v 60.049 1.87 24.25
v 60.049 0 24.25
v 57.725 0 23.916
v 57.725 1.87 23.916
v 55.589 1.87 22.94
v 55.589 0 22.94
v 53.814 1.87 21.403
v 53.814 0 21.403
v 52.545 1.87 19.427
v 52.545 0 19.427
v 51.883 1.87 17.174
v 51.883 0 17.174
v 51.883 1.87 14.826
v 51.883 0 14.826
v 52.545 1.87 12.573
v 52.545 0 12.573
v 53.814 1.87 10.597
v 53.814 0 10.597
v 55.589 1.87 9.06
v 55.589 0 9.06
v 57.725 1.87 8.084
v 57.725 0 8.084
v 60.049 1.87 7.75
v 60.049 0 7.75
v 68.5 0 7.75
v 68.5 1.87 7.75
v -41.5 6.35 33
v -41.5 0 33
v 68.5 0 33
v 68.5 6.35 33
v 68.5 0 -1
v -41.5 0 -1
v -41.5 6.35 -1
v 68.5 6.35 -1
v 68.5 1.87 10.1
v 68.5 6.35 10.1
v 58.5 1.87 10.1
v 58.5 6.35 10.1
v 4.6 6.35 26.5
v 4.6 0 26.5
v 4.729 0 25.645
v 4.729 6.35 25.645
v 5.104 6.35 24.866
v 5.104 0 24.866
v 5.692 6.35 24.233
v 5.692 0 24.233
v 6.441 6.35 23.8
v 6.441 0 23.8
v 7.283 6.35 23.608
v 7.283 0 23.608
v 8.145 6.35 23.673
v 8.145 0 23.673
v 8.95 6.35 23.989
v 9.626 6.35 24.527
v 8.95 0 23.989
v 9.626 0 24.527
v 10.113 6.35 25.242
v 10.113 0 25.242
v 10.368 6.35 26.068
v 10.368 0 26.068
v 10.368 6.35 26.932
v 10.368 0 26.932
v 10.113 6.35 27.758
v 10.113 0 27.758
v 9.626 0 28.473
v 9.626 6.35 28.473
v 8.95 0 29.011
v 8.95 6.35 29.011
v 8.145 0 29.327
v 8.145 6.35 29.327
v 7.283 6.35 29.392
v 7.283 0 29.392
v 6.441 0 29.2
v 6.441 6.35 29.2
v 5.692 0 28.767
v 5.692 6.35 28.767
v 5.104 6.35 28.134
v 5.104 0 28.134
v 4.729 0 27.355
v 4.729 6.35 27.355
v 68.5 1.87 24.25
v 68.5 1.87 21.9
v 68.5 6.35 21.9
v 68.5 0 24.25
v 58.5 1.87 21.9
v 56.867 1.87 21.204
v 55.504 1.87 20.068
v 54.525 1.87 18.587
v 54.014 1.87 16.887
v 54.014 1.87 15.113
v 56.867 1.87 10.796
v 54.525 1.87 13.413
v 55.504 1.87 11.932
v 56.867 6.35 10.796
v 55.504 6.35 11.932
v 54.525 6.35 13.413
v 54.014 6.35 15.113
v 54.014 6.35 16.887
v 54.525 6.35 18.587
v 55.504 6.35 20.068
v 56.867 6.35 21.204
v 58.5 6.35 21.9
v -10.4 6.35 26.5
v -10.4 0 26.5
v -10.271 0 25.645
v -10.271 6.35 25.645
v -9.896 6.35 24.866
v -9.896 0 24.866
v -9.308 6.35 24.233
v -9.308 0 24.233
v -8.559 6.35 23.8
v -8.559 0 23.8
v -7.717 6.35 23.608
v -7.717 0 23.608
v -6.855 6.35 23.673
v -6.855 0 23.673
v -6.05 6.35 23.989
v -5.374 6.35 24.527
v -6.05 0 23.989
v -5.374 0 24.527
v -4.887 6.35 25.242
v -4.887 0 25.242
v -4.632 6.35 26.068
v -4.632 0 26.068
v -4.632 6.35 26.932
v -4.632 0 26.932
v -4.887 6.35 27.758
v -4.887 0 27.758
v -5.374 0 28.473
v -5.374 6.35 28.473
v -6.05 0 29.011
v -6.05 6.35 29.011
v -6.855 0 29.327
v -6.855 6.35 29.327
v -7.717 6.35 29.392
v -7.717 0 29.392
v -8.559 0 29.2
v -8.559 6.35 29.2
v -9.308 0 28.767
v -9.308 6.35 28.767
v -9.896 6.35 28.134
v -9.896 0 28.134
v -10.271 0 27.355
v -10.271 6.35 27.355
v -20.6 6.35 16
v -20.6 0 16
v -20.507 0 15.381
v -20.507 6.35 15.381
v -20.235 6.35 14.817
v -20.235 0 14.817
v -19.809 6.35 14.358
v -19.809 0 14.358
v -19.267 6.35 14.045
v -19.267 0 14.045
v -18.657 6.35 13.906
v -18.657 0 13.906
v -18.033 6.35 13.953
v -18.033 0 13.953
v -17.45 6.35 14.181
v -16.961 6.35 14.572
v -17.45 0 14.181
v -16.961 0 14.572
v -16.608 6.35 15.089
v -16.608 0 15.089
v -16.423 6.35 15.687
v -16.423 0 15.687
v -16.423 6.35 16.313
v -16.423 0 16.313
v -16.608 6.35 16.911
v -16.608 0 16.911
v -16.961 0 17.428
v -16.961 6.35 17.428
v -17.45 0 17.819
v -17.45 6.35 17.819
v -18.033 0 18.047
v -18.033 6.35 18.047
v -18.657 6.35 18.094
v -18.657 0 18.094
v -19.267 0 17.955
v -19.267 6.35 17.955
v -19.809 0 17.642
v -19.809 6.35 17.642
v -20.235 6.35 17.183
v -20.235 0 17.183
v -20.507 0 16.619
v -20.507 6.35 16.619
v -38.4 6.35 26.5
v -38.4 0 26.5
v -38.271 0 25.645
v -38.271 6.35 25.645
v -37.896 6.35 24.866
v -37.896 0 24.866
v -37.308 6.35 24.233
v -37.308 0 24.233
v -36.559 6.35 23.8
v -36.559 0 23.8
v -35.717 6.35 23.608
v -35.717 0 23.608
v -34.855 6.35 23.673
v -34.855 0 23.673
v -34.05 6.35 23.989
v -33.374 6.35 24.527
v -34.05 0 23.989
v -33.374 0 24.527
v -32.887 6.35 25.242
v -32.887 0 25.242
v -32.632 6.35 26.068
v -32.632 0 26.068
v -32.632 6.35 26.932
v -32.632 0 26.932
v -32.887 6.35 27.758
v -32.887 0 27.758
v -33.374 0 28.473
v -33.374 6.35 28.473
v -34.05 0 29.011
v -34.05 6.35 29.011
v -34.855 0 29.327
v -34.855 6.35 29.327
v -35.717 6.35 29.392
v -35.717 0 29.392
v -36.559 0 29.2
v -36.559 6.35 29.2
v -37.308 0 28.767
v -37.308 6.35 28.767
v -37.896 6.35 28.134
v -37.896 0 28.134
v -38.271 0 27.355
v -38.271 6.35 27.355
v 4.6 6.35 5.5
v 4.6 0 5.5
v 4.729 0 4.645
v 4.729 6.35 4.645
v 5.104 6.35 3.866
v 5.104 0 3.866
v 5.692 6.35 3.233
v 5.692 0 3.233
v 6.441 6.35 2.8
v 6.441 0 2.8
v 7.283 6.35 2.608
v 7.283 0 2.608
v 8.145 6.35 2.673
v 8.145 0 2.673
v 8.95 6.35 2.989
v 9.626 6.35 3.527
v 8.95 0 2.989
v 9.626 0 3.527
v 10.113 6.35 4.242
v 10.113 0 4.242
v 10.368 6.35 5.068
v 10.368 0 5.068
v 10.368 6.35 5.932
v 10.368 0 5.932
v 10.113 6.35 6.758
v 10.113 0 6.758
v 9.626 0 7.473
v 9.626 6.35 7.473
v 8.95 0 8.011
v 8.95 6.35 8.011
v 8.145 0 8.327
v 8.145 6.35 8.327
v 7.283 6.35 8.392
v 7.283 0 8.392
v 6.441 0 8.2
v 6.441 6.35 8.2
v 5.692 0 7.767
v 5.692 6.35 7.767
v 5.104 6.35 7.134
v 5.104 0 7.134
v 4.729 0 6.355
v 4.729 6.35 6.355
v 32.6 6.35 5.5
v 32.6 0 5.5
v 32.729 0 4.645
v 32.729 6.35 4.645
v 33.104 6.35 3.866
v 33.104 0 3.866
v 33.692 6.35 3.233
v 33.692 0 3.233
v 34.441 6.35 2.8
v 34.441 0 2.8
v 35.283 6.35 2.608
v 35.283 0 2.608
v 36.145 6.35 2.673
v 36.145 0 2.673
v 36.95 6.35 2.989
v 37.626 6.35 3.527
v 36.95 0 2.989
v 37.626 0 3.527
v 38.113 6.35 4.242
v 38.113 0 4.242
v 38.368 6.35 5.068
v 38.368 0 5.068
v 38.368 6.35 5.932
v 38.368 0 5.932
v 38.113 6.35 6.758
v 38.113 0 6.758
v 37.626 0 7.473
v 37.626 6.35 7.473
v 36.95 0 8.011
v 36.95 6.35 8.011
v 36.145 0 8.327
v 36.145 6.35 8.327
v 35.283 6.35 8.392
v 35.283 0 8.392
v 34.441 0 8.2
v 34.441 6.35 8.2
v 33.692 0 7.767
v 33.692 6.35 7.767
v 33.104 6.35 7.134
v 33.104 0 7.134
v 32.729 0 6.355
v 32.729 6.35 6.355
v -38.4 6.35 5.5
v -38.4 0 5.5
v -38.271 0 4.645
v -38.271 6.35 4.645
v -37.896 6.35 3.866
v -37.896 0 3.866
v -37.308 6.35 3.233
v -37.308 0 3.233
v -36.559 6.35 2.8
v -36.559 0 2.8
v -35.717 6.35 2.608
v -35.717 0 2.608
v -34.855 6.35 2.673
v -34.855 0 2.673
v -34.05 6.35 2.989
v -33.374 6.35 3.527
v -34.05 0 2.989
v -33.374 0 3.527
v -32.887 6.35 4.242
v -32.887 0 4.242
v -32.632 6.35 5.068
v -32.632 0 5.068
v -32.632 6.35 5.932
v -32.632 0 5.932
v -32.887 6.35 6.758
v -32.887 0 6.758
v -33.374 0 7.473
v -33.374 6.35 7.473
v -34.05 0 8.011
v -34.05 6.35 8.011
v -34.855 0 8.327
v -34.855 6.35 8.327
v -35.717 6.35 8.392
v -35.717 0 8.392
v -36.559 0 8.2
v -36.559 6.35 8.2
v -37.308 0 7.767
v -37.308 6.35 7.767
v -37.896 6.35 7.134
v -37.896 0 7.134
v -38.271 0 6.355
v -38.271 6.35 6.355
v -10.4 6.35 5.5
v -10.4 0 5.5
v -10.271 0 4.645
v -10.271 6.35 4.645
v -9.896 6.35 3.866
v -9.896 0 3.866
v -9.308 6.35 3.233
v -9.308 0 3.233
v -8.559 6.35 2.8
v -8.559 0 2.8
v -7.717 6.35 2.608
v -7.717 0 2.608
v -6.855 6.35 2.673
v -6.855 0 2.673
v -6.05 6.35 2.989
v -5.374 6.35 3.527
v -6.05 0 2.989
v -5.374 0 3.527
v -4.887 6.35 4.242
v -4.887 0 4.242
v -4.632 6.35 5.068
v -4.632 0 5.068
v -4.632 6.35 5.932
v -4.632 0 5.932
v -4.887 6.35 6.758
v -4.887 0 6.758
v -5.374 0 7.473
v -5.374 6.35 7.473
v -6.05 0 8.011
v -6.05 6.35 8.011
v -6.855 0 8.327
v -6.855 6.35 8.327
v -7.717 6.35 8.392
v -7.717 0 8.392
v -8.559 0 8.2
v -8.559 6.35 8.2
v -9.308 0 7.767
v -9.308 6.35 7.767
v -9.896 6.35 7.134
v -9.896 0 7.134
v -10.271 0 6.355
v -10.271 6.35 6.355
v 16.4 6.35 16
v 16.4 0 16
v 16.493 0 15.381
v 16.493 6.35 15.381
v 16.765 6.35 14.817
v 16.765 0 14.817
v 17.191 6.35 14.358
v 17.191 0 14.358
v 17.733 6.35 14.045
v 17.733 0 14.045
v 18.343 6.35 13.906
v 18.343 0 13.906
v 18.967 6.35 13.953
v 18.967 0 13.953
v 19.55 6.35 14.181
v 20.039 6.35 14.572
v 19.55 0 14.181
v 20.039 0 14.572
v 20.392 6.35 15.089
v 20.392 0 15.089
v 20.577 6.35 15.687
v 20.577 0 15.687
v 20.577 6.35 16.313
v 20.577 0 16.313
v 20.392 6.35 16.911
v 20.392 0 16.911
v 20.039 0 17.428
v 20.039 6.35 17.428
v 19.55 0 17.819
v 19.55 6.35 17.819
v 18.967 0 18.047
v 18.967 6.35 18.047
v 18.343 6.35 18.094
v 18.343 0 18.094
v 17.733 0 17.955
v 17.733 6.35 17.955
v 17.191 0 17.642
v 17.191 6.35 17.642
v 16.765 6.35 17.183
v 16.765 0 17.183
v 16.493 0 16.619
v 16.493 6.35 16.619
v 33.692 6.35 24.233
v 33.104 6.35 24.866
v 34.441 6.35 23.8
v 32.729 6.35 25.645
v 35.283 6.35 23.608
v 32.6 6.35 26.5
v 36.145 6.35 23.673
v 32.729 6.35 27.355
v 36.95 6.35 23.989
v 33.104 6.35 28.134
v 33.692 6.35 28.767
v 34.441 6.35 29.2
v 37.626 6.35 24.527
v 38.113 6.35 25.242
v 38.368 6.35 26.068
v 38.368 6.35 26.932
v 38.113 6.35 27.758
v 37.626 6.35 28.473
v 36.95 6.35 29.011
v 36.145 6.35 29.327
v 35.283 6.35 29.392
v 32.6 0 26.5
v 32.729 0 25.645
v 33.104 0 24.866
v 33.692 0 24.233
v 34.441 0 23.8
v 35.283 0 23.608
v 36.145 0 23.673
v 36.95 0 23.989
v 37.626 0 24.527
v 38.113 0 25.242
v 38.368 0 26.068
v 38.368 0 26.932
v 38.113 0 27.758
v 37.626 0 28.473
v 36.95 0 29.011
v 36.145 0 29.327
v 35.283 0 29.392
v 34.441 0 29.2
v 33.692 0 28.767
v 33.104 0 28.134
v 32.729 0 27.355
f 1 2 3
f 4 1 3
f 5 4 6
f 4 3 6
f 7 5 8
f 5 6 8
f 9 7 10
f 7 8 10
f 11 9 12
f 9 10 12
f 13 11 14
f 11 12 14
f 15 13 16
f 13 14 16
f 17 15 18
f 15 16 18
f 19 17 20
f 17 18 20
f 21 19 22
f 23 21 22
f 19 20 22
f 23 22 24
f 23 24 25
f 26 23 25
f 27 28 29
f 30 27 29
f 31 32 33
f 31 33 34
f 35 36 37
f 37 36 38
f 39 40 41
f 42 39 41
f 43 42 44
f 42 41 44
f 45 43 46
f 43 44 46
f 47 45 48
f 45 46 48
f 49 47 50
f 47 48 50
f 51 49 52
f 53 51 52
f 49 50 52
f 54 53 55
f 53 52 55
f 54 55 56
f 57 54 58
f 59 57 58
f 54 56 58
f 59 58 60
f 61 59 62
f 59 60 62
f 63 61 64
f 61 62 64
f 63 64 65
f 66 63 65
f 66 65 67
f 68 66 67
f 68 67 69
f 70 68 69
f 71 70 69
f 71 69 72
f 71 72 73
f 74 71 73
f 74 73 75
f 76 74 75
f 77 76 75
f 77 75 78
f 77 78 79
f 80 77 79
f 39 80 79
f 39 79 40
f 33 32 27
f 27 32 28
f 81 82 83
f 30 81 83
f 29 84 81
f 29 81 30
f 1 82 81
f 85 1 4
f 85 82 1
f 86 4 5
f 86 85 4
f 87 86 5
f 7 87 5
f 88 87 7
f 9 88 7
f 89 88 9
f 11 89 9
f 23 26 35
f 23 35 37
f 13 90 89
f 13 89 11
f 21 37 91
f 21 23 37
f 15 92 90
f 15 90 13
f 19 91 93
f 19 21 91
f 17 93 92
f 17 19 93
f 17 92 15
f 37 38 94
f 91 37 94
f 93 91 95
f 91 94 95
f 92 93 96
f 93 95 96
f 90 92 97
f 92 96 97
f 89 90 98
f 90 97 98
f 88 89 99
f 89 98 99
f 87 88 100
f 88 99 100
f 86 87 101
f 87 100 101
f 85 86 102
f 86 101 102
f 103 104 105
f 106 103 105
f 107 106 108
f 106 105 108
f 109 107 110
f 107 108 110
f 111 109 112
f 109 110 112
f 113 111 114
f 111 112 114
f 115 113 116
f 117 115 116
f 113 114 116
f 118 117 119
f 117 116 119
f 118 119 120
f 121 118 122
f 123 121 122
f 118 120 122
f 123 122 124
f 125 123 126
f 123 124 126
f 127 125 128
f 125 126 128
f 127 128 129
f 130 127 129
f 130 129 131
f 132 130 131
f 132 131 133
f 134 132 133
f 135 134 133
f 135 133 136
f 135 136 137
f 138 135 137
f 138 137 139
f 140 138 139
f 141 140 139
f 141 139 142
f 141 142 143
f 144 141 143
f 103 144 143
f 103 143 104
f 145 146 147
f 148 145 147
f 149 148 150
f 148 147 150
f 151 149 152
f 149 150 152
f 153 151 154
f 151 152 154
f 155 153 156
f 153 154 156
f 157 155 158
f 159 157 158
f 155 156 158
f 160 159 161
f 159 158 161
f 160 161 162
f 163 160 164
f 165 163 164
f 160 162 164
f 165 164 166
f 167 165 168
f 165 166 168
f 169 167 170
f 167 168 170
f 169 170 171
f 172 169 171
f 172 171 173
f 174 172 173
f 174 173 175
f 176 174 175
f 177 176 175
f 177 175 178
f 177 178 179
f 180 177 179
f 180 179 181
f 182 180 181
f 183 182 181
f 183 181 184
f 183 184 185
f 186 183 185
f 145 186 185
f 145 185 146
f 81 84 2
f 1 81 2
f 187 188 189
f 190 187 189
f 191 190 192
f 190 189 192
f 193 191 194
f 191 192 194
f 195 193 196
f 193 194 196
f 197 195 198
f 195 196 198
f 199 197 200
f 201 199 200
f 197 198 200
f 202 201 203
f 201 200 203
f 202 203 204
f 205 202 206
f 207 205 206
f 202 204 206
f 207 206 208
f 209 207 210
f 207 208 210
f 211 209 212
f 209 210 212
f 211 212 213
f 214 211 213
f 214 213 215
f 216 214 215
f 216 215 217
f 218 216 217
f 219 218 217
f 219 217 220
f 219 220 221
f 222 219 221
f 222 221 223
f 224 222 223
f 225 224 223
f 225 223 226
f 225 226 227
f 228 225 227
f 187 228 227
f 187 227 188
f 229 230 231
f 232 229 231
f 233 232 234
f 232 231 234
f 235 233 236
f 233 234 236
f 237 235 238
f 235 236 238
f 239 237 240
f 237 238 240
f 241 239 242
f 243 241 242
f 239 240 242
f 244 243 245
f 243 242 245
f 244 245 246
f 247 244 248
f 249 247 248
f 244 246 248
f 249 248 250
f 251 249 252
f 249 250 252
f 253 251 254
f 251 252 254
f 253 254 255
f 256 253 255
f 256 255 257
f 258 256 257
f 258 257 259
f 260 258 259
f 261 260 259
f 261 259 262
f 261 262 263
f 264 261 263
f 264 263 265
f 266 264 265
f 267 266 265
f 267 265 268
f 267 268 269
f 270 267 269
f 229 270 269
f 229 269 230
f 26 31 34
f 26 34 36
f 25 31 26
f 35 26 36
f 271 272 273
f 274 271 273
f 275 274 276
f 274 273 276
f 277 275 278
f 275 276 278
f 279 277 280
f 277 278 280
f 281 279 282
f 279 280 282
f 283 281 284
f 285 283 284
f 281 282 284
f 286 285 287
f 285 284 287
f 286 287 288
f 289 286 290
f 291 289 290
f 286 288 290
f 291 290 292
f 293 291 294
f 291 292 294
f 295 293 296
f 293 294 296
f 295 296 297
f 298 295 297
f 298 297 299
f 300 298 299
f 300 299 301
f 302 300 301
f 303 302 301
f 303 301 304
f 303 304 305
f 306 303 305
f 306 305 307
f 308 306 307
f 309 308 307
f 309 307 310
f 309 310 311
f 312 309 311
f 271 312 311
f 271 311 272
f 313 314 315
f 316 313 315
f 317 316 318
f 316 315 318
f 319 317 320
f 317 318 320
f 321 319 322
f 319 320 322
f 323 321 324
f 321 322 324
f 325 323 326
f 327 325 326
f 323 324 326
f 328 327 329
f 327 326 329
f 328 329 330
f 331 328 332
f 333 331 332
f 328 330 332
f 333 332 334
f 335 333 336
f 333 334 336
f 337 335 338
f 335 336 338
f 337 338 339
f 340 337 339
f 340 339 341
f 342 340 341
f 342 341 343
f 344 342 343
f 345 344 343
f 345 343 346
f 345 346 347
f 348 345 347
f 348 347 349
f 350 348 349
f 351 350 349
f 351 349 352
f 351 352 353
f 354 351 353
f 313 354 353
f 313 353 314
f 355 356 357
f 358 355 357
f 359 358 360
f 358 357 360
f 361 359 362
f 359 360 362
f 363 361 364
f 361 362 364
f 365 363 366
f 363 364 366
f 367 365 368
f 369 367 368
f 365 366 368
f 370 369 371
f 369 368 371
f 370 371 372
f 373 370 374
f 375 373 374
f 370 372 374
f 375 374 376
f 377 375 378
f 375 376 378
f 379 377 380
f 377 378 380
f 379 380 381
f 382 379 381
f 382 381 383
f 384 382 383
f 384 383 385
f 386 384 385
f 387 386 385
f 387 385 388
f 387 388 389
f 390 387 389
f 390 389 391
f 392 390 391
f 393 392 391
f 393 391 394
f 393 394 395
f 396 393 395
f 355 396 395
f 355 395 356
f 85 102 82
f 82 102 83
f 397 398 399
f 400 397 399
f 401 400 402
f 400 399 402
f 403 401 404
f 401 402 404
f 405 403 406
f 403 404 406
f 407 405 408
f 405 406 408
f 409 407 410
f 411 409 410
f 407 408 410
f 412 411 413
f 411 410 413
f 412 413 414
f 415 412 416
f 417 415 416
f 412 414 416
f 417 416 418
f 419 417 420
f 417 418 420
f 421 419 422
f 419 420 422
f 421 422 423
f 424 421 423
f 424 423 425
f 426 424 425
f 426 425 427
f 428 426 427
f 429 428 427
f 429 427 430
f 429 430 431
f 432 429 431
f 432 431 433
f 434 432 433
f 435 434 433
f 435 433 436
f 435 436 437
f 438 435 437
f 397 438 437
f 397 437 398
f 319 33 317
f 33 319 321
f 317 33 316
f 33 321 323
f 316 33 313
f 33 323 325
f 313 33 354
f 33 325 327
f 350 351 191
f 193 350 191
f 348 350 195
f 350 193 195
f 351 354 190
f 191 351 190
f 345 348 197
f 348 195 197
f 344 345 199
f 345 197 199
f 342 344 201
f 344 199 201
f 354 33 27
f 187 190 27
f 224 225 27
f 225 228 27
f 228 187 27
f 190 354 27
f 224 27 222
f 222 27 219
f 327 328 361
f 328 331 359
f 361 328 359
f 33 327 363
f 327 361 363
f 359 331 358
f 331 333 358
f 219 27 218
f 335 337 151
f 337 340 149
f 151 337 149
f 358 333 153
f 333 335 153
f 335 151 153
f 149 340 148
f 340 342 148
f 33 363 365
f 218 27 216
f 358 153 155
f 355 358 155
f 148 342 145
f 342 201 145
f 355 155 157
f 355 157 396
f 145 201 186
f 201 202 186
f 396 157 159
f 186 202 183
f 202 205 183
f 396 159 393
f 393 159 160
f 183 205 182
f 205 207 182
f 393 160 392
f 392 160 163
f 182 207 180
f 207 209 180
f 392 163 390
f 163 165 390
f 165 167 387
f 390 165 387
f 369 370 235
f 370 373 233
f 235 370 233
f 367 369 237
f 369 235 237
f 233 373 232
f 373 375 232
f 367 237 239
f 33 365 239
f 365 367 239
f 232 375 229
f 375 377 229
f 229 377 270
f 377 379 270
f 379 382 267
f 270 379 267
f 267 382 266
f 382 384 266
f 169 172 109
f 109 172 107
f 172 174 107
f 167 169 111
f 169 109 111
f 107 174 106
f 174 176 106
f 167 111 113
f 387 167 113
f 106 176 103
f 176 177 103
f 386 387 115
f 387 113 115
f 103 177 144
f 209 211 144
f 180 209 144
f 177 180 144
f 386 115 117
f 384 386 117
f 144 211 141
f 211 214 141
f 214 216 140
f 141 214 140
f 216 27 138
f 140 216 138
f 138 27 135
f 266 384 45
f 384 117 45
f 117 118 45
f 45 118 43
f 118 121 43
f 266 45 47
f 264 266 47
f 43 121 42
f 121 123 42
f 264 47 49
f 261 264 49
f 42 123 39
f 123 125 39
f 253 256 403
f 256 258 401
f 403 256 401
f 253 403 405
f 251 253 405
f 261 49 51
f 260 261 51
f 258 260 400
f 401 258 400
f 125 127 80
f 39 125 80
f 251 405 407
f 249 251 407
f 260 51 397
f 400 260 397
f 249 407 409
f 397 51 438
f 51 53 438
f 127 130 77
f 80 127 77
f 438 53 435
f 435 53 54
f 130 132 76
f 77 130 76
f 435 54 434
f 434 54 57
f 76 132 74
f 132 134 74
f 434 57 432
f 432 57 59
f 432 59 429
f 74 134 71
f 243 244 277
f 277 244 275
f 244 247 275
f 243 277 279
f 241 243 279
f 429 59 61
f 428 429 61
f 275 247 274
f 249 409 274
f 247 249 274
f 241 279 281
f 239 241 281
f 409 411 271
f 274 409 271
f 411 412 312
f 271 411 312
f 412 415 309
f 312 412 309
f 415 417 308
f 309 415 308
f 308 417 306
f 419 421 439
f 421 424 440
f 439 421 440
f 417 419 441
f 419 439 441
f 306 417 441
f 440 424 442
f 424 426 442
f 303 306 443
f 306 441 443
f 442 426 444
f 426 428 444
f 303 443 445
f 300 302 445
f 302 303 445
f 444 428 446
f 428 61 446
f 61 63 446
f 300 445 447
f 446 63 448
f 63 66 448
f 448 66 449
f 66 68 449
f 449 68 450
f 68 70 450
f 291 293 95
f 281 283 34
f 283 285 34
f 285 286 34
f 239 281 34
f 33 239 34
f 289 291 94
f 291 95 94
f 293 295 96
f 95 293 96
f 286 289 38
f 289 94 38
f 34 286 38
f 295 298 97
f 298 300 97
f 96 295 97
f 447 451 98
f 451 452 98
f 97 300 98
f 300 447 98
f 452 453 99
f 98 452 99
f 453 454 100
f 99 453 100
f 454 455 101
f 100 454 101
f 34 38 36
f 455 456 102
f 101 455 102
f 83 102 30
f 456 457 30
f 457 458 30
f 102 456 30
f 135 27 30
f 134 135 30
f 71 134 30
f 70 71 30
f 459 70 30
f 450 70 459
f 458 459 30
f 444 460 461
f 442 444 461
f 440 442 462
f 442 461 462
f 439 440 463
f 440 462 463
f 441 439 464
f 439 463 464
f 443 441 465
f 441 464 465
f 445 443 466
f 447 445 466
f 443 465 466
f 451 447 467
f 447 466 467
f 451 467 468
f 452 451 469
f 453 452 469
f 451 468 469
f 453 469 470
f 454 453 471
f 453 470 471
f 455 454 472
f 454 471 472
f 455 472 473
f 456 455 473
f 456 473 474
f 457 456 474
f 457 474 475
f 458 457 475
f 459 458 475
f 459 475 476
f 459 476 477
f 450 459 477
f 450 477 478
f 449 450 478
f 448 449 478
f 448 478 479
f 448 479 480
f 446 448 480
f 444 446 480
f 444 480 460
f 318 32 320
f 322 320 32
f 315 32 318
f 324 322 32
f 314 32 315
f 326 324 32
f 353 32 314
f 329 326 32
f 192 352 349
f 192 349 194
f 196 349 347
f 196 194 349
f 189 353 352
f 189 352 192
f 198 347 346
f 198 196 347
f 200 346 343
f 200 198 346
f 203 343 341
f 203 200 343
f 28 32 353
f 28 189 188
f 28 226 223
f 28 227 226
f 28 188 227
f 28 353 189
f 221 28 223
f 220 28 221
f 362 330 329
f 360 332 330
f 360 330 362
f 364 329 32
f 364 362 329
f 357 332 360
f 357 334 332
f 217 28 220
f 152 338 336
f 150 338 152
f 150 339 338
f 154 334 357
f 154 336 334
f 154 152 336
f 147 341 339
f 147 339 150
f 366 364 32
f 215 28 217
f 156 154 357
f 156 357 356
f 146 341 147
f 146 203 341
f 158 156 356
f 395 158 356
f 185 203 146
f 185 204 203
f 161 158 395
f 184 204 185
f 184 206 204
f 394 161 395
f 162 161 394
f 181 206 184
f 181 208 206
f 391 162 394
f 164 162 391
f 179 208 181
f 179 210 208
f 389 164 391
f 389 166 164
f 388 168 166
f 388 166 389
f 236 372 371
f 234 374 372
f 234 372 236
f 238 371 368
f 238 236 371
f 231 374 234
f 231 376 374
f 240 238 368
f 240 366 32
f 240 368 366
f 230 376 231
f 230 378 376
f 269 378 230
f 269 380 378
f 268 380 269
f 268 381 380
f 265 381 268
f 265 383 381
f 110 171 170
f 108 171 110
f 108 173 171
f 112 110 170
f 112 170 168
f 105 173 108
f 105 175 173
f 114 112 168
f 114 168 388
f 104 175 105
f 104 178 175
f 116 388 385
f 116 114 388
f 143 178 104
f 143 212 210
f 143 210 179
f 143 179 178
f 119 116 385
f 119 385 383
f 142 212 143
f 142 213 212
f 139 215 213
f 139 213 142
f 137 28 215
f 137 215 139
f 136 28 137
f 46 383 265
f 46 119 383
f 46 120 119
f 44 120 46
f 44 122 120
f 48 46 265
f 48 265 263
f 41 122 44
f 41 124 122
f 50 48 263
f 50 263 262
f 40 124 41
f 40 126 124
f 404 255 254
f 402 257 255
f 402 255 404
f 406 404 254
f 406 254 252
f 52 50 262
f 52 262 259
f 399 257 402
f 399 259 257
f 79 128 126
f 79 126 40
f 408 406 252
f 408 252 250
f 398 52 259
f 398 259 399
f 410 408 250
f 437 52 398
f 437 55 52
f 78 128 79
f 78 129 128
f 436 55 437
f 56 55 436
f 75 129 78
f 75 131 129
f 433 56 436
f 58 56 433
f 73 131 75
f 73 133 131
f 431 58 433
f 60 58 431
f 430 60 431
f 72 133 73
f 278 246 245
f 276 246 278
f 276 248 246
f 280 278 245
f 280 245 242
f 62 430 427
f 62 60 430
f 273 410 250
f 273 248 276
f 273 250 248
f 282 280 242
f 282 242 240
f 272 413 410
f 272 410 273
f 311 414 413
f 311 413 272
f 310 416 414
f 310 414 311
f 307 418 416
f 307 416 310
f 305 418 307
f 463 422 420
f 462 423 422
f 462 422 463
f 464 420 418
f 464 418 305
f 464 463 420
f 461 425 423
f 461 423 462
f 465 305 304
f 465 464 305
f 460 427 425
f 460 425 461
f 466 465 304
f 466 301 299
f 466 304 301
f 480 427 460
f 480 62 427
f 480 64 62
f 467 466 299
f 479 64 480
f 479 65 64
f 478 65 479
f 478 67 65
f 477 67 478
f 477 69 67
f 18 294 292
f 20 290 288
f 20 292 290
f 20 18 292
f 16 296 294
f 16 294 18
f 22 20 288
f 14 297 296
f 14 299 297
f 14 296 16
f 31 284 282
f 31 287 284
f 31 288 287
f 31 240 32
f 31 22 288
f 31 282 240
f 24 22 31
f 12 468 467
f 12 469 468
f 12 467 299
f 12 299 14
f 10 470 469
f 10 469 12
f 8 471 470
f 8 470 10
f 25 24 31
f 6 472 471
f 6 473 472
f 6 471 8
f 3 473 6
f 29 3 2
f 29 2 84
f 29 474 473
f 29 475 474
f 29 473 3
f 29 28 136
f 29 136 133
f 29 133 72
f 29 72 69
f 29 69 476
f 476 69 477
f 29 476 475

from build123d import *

# Parameters (mm, degrees)
SKETCH1_W                   = 110
SKETCH1_H                   = 34
BOSS_EXTRUDE1_DEPTH         = 6.35
M5_CLEARANCE_HOLE1_D        = 5.8
TAP_DRILL_FOR_M5X0_8_TAP1_D = 4.2
CUT_EXTRUDE1_DEPTH          = 77.299230009
CUT_EXTRUDE2_DEPTH          = 1.87


with BuildPart() as part:
    # Sketch1 → Boss-Extrude1 (new body)
    with BuildSketch(Plane.XZ):
        with Locations((13.5, 16)):
            Rectangle(SKETCH1_W, SKETCH1_H)
    extrude(amount=-BOSS_EXTRUDE1_DEPTH)

    # M5 Clearance Hole1 (through all)
    with Locations(Plane(origin=(0, 6.35, 0), x_dir=(1, 0, 0), z_dir=(0, 1, 0))):
        with Locations((-35.5, -5.5), (-7.5, -5.5), (7.5, -5.5), (35.5, -5.5), (-35.5, -26.5), (-7.5, -26.5), (7.5, -26.5), (35.5, -26.5)):
            Hole(M5_CLEARANCE_HOLE1_D / 2)

    # Tap Drill for M5x0.8 Tap1 (through all)
    with Locations(Plane(origin=(0, 6.35, 0), x_dir=(1, 0, 0), z_dir=(0, 1, 0))):
        with Locations((-18.5, -16), (18.5, -16)):
            Hole(TAP_DRILL_FOR_M5X0_8_TAP1_D / 2)

    # Sketch9 → Cut-Extrude1 (cut, through all)
    with BuildSketch(Plane(origin=(0, 6.35, 0), x_dir=(1, 0, 0), z_dir=(0, 1, 0))):
        with BuildLine():
            Line((68.5, -10.1), (58.5, -10.1))
            ThreePointArc((58.5, -10.1), (53.949193338, -16), (58.5, -21.9))
            Line((58.5, -21.9), (68.5, -21.9))
            Line((68.5, -21.9), (68.5, -10.1))
        make_face()
    extrude(amount=-CUT_EXTRUDE1_DEPTH, mode=Mode.SUBTRACT)

    # Sketch10 → Cut-Extrude2 (cut)
    with BuildSketch(Plane(origin=(0, 0, 0), x_dir=(1, 0, 0), z_dir=(0, 1, 0))):
        with BuildLine():
            Line((68.5, -24.25), (60.049193338, -24.25))
            ThreePointArc((60.049193338, -24.25), (51.799193338, -16), (60.049193338, -7.75))
            Line((60.049193338, -7.75), (68.5, -7.75))
            Line((68.5, -7.75), (68.5, -24.25))
        make_face()
    extrude(amount=CUT_EXTRUDE2_DEPTH, mode=Mode.SUBTRACT)


solid = part.part
